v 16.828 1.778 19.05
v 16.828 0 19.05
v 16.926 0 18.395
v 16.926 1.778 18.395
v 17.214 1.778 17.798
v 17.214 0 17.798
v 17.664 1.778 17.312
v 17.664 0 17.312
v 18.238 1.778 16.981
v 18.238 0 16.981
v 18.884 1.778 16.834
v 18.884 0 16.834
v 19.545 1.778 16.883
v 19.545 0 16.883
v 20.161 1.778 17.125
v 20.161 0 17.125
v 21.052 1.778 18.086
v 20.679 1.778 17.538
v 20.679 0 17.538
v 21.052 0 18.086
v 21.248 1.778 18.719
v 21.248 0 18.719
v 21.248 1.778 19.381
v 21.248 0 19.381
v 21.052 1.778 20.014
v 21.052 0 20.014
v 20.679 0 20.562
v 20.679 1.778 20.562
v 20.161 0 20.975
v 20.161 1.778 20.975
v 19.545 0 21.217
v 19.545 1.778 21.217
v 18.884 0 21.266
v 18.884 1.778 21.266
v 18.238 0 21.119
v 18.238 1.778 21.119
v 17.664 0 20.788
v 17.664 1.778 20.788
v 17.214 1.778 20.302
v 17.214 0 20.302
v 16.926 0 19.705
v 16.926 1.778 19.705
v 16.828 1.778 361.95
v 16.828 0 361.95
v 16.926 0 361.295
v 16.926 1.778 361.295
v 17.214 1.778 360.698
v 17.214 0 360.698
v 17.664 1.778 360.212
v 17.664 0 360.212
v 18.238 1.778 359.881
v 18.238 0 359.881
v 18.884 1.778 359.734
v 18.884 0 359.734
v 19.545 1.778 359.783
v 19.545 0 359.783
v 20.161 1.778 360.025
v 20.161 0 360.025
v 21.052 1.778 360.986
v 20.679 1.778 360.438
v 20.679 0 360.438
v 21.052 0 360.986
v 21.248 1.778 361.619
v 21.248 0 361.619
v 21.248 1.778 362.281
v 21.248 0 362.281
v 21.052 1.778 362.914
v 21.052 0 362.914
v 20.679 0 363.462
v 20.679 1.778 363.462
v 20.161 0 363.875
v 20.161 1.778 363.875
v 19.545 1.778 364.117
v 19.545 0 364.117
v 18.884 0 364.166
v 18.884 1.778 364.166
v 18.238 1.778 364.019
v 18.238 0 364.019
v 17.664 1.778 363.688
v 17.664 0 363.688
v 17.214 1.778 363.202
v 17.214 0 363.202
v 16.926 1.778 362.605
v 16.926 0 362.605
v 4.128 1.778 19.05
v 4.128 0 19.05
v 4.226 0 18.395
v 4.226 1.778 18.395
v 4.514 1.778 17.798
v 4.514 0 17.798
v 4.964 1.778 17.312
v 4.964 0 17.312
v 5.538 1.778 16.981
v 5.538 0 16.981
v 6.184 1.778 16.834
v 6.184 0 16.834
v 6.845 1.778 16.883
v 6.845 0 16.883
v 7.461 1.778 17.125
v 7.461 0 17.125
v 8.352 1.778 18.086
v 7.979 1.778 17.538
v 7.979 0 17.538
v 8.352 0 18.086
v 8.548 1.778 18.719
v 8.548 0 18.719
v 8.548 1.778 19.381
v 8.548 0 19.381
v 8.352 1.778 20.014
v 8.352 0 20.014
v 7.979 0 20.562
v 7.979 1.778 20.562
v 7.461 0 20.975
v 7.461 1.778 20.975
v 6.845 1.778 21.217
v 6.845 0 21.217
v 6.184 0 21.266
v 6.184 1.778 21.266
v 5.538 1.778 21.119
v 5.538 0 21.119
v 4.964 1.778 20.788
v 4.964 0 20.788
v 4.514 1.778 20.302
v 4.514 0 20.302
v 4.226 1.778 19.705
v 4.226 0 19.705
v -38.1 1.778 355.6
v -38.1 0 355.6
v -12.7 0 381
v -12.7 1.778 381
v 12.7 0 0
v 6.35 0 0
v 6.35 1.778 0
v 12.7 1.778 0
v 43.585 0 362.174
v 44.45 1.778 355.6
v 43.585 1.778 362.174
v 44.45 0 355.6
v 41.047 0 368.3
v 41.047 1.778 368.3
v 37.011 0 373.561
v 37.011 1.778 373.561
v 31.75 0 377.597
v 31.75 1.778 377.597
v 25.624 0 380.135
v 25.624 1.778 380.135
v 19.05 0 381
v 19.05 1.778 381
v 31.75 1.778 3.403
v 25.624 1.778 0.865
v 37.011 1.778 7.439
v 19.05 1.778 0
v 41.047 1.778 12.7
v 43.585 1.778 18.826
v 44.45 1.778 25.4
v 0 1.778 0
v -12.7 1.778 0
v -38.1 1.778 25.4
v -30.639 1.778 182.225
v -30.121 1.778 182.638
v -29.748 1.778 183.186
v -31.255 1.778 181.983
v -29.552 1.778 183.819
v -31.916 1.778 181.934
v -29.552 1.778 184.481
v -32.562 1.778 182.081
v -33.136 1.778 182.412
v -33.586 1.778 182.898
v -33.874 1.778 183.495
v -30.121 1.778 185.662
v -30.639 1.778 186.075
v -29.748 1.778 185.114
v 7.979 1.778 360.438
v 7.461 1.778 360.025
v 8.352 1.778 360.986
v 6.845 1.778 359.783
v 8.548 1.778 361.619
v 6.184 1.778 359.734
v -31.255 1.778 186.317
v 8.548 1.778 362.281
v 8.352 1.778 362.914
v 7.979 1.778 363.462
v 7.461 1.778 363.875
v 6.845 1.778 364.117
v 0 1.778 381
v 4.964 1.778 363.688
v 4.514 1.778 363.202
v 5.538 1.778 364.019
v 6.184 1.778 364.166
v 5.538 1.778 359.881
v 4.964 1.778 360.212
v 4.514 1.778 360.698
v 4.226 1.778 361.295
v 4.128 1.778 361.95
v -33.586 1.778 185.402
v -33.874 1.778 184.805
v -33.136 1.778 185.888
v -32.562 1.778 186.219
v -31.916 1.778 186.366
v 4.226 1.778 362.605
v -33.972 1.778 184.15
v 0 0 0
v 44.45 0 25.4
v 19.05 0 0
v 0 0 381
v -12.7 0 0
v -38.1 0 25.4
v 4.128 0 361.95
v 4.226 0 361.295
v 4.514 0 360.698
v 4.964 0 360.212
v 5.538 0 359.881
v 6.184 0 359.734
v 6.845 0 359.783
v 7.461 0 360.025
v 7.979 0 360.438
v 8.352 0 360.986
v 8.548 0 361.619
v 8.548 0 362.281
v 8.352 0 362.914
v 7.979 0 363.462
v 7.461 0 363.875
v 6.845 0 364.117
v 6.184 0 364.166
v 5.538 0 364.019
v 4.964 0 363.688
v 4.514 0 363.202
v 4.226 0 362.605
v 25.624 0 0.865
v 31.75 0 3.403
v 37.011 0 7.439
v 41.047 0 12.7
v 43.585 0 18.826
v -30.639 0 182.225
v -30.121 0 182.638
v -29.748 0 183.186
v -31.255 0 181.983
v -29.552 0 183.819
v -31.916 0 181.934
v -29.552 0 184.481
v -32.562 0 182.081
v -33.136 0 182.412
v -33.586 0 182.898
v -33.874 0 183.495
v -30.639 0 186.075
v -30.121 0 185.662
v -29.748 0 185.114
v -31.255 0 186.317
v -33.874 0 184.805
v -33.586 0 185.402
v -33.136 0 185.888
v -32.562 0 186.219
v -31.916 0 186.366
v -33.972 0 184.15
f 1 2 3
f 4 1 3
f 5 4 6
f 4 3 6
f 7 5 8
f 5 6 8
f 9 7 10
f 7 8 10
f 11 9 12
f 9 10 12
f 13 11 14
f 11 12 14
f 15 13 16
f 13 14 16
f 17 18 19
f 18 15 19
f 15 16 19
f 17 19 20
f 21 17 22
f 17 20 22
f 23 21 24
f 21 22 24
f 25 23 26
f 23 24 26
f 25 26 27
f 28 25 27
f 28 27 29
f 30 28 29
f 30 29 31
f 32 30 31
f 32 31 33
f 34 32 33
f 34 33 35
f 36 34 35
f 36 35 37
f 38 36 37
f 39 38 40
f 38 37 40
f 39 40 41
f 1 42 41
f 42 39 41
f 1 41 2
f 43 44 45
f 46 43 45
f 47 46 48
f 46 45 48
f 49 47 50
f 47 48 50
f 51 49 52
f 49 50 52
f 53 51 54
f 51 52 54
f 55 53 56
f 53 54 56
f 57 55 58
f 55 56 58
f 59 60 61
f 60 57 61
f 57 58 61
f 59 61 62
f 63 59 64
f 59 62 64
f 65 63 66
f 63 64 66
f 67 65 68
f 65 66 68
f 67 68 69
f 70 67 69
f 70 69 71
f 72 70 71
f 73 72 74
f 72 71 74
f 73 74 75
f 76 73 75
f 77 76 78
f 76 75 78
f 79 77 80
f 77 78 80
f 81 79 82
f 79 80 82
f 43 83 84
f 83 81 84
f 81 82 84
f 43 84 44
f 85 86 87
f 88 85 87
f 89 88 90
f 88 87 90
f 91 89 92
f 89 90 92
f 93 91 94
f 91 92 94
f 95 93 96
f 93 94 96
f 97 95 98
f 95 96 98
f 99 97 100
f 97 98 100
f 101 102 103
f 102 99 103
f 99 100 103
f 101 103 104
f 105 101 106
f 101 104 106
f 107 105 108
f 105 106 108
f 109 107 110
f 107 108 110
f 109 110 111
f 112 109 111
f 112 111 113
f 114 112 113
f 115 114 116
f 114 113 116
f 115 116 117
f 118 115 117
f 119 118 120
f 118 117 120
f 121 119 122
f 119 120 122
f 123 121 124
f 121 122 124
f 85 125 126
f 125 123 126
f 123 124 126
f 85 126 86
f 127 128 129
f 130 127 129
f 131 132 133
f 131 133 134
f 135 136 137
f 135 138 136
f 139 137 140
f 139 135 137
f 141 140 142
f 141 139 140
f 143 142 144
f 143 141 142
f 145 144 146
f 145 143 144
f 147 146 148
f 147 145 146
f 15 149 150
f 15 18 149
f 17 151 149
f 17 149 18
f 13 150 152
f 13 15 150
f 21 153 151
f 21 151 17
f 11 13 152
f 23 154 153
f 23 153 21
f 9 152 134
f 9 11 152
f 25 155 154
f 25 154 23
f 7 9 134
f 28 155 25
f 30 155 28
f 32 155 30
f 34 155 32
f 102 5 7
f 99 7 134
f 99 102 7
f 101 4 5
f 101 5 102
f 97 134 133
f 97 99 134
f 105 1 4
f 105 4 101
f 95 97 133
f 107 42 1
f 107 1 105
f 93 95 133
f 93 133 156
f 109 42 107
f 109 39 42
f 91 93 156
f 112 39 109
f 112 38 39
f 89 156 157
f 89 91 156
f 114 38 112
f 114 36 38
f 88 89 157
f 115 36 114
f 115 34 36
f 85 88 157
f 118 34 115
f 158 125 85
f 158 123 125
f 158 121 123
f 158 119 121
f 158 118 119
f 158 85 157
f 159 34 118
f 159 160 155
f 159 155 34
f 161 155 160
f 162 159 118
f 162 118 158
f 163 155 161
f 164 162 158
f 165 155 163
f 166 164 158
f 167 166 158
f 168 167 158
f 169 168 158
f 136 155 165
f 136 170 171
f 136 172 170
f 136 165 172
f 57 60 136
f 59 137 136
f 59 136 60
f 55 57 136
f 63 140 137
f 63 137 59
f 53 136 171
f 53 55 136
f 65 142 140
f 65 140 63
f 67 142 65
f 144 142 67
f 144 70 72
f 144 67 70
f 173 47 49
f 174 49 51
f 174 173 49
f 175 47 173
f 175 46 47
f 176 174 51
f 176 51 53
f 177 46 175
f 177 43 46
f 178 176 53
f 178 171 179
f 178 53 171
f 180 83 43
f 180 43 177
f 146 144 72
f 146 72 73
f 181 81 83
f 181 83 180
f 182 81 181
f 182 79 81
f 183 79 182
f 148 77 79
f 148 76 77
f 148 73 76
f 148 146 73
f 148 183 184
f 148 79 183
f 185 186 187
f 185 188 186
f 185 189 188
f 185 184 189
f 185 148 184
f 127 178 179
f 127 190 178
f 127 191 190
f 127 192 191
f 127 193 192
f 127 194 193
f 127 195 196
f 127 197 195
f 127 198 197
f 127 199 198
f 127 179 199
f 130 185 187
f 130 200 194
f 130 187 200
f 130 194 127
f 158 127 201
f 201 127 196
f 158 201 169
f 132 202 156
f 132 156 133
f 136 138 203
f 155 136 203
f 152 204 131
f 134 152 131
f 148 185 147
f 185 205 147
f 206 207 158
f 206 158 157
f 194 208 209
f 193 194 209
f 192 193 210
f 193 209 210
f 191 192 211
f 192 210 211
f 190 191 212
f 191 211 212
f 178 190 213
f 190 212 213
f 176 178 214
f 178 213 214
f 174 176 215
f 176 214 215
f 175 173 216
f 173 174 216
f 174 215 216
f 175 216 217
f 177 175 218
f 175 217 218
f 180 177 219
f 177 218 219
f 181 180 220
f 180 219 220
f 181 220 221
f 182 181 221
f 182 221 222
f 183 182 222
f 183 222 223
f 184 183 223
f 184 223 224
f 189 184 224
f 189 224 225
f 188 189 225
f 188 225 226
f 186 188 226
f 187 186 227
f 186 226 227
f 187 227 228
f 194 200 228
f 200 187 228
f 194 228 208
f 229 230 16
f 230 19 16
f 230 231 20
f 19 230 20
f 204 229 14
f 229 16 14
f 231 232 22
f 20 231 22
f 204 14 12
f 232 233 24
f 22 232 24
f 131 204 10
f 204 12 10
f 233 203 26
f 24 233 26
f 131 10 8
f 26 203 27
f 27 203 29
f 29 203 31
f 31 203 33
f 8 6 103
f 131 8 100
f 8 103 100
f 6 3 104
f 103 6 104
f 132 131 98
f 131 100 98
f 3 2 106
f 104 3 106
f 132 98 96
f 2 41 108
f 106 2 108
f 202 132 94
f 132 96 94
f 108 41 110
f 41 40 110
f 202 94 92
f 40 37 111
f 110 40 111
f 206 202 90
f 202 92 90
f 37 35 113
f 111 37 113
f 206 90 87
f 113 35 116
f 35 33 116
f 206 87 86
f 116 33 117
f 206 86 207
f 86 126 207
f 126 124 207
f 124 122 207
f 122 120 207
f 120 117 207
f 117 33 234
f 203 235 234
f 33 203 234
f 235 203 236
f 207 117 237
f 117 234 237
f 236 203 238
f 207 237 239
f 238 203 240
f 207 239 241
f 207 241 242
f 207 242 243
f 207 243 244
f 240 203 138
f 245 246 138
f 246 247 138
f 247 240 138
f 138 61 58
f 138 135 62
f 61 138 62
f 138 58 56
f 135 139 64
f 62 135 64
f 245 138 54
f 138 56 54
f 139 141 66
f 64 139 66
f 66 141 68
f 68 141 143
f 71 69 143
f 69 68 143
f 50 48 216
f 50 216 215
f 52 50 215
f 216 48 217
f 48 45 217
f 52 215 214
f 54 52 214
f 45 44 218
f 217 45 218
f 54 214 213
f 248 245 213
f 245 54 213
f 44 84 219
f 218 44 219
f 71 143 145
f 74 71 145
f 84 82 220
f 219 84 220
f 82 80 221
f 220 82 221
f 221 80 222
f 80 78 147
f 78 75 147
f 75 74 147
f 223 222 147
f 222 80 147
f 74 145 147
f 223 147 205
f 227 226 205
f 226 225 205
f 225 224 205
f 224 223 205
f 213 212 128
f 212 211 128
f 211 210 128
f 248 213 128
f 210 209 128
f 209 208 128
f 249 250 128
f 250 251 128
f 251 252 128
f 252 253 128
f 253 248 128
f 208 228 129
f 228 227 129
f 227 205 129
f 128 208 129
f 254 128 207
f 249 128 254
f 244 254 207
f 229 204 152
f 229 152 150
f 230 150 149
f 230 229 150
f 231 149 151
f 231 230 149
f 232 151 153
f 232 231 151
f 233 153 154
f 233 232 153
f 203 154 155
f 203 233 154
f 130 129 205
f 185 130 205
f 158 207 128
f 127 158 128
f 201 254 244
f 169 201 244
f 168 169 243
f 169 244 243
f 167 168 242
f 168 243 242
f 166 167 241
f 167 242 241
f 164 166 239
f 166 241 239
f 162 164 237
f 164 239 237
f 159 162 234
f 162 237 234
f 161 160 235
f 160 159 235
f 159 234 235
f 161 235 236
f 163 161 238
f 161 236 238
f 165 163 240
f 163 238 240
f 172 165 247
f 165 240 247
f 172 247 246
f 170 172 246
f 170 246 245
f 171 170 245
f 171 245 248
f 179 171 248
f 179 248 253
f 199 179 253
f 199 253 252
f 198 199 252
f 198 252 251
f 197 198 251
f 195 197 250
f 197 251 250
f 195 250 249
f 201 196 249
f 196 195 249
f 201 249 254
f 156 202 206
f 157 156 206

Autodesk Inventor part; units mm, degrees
ref_plane "YZ Plane" through (0, 0, 0) normal (1, 0, 0) x (0, 1, 0)
ref_plane "XZ Plane" through (0, 0, 0) normal (0, 1, 0) x (-1, 0, 0)
ref_plane "XY Plane" through (0, 0, 0) normal (0, 0, 1) x (1, 0, 0)
sketch "Sketch1" plane through (0, 0, 0) normal (0, 1, 0) x (-1, 0, 0)
  line L0 (0, 0) -> (-12.7, 0)
  line L1 (0, 0) -> (12.7, 0)
  line L2 (38.1, 25.4) -> (38.1, 355.6)
  line L3 (12.7, 381) -> (0, 381)
  line L4 (38.1, 355.6) -> (12.7, 381)
  line L5 (38.1, 25.4) -> (12.7, 0)
  circle A0 centre (31.75, 184.15) radius 2.2225
  circle A1 centre (-6.35, 19.05) radius 2.2225
  circle A2 centre (-19.05, 19.05) radius 2.2225
  circle A3 centre (-6.35, 361.95) radius 2.2225
  circle A4 centre (-19.05, 361.95) radius 2.2225
  line L6 (-6.35, 0) -> (0, 0)
  line L7 (0, 381) -> (-19.05, 381)
  line L8 (-44.45, 355.6) -> (-44.45, 25.4)
  line L9 (-19.05, 0) -> (0, 0)
  arc A5 (-19.05, 381) -> (-44.45, 355.6) centre (-19.05, 355.6) ccw
  arc A6 (-44.45, 25.4) -> (-19.05, 0) centre (-19.05, 25.4) ccw
  point P0 (38.1, 381)
  point P1 (38.1, 0)
  point P2 (-44.45, 0)
  point P3 (-44.45, 381)
  dimension "d2" = 38.1
  dimension "d3" = 381
  dimension "d5" = 25.4
  dimension "d6" = 25.4
  dimension "d7" = 25.4
  dimension "d8" = 25.4
  dimension "d12" = 4.445
  dimension "d13" = 4.445
  dimension "d14" = 4.445
  dimension "d15" = 4.445
  dimension "d16" = 4.445
  dimension "d20" = 44.45
  dimension "d21" = 381
  dimension "d22" = 25.4
extrude "Extrusion1" add sketch "Sketch1" along normal blind 1.778
equation "\"d6\" = d5"
equation "\"d7\" = d5"
equation "\"d8\" = d7"
properties part number "side_ring_guard_piece"
